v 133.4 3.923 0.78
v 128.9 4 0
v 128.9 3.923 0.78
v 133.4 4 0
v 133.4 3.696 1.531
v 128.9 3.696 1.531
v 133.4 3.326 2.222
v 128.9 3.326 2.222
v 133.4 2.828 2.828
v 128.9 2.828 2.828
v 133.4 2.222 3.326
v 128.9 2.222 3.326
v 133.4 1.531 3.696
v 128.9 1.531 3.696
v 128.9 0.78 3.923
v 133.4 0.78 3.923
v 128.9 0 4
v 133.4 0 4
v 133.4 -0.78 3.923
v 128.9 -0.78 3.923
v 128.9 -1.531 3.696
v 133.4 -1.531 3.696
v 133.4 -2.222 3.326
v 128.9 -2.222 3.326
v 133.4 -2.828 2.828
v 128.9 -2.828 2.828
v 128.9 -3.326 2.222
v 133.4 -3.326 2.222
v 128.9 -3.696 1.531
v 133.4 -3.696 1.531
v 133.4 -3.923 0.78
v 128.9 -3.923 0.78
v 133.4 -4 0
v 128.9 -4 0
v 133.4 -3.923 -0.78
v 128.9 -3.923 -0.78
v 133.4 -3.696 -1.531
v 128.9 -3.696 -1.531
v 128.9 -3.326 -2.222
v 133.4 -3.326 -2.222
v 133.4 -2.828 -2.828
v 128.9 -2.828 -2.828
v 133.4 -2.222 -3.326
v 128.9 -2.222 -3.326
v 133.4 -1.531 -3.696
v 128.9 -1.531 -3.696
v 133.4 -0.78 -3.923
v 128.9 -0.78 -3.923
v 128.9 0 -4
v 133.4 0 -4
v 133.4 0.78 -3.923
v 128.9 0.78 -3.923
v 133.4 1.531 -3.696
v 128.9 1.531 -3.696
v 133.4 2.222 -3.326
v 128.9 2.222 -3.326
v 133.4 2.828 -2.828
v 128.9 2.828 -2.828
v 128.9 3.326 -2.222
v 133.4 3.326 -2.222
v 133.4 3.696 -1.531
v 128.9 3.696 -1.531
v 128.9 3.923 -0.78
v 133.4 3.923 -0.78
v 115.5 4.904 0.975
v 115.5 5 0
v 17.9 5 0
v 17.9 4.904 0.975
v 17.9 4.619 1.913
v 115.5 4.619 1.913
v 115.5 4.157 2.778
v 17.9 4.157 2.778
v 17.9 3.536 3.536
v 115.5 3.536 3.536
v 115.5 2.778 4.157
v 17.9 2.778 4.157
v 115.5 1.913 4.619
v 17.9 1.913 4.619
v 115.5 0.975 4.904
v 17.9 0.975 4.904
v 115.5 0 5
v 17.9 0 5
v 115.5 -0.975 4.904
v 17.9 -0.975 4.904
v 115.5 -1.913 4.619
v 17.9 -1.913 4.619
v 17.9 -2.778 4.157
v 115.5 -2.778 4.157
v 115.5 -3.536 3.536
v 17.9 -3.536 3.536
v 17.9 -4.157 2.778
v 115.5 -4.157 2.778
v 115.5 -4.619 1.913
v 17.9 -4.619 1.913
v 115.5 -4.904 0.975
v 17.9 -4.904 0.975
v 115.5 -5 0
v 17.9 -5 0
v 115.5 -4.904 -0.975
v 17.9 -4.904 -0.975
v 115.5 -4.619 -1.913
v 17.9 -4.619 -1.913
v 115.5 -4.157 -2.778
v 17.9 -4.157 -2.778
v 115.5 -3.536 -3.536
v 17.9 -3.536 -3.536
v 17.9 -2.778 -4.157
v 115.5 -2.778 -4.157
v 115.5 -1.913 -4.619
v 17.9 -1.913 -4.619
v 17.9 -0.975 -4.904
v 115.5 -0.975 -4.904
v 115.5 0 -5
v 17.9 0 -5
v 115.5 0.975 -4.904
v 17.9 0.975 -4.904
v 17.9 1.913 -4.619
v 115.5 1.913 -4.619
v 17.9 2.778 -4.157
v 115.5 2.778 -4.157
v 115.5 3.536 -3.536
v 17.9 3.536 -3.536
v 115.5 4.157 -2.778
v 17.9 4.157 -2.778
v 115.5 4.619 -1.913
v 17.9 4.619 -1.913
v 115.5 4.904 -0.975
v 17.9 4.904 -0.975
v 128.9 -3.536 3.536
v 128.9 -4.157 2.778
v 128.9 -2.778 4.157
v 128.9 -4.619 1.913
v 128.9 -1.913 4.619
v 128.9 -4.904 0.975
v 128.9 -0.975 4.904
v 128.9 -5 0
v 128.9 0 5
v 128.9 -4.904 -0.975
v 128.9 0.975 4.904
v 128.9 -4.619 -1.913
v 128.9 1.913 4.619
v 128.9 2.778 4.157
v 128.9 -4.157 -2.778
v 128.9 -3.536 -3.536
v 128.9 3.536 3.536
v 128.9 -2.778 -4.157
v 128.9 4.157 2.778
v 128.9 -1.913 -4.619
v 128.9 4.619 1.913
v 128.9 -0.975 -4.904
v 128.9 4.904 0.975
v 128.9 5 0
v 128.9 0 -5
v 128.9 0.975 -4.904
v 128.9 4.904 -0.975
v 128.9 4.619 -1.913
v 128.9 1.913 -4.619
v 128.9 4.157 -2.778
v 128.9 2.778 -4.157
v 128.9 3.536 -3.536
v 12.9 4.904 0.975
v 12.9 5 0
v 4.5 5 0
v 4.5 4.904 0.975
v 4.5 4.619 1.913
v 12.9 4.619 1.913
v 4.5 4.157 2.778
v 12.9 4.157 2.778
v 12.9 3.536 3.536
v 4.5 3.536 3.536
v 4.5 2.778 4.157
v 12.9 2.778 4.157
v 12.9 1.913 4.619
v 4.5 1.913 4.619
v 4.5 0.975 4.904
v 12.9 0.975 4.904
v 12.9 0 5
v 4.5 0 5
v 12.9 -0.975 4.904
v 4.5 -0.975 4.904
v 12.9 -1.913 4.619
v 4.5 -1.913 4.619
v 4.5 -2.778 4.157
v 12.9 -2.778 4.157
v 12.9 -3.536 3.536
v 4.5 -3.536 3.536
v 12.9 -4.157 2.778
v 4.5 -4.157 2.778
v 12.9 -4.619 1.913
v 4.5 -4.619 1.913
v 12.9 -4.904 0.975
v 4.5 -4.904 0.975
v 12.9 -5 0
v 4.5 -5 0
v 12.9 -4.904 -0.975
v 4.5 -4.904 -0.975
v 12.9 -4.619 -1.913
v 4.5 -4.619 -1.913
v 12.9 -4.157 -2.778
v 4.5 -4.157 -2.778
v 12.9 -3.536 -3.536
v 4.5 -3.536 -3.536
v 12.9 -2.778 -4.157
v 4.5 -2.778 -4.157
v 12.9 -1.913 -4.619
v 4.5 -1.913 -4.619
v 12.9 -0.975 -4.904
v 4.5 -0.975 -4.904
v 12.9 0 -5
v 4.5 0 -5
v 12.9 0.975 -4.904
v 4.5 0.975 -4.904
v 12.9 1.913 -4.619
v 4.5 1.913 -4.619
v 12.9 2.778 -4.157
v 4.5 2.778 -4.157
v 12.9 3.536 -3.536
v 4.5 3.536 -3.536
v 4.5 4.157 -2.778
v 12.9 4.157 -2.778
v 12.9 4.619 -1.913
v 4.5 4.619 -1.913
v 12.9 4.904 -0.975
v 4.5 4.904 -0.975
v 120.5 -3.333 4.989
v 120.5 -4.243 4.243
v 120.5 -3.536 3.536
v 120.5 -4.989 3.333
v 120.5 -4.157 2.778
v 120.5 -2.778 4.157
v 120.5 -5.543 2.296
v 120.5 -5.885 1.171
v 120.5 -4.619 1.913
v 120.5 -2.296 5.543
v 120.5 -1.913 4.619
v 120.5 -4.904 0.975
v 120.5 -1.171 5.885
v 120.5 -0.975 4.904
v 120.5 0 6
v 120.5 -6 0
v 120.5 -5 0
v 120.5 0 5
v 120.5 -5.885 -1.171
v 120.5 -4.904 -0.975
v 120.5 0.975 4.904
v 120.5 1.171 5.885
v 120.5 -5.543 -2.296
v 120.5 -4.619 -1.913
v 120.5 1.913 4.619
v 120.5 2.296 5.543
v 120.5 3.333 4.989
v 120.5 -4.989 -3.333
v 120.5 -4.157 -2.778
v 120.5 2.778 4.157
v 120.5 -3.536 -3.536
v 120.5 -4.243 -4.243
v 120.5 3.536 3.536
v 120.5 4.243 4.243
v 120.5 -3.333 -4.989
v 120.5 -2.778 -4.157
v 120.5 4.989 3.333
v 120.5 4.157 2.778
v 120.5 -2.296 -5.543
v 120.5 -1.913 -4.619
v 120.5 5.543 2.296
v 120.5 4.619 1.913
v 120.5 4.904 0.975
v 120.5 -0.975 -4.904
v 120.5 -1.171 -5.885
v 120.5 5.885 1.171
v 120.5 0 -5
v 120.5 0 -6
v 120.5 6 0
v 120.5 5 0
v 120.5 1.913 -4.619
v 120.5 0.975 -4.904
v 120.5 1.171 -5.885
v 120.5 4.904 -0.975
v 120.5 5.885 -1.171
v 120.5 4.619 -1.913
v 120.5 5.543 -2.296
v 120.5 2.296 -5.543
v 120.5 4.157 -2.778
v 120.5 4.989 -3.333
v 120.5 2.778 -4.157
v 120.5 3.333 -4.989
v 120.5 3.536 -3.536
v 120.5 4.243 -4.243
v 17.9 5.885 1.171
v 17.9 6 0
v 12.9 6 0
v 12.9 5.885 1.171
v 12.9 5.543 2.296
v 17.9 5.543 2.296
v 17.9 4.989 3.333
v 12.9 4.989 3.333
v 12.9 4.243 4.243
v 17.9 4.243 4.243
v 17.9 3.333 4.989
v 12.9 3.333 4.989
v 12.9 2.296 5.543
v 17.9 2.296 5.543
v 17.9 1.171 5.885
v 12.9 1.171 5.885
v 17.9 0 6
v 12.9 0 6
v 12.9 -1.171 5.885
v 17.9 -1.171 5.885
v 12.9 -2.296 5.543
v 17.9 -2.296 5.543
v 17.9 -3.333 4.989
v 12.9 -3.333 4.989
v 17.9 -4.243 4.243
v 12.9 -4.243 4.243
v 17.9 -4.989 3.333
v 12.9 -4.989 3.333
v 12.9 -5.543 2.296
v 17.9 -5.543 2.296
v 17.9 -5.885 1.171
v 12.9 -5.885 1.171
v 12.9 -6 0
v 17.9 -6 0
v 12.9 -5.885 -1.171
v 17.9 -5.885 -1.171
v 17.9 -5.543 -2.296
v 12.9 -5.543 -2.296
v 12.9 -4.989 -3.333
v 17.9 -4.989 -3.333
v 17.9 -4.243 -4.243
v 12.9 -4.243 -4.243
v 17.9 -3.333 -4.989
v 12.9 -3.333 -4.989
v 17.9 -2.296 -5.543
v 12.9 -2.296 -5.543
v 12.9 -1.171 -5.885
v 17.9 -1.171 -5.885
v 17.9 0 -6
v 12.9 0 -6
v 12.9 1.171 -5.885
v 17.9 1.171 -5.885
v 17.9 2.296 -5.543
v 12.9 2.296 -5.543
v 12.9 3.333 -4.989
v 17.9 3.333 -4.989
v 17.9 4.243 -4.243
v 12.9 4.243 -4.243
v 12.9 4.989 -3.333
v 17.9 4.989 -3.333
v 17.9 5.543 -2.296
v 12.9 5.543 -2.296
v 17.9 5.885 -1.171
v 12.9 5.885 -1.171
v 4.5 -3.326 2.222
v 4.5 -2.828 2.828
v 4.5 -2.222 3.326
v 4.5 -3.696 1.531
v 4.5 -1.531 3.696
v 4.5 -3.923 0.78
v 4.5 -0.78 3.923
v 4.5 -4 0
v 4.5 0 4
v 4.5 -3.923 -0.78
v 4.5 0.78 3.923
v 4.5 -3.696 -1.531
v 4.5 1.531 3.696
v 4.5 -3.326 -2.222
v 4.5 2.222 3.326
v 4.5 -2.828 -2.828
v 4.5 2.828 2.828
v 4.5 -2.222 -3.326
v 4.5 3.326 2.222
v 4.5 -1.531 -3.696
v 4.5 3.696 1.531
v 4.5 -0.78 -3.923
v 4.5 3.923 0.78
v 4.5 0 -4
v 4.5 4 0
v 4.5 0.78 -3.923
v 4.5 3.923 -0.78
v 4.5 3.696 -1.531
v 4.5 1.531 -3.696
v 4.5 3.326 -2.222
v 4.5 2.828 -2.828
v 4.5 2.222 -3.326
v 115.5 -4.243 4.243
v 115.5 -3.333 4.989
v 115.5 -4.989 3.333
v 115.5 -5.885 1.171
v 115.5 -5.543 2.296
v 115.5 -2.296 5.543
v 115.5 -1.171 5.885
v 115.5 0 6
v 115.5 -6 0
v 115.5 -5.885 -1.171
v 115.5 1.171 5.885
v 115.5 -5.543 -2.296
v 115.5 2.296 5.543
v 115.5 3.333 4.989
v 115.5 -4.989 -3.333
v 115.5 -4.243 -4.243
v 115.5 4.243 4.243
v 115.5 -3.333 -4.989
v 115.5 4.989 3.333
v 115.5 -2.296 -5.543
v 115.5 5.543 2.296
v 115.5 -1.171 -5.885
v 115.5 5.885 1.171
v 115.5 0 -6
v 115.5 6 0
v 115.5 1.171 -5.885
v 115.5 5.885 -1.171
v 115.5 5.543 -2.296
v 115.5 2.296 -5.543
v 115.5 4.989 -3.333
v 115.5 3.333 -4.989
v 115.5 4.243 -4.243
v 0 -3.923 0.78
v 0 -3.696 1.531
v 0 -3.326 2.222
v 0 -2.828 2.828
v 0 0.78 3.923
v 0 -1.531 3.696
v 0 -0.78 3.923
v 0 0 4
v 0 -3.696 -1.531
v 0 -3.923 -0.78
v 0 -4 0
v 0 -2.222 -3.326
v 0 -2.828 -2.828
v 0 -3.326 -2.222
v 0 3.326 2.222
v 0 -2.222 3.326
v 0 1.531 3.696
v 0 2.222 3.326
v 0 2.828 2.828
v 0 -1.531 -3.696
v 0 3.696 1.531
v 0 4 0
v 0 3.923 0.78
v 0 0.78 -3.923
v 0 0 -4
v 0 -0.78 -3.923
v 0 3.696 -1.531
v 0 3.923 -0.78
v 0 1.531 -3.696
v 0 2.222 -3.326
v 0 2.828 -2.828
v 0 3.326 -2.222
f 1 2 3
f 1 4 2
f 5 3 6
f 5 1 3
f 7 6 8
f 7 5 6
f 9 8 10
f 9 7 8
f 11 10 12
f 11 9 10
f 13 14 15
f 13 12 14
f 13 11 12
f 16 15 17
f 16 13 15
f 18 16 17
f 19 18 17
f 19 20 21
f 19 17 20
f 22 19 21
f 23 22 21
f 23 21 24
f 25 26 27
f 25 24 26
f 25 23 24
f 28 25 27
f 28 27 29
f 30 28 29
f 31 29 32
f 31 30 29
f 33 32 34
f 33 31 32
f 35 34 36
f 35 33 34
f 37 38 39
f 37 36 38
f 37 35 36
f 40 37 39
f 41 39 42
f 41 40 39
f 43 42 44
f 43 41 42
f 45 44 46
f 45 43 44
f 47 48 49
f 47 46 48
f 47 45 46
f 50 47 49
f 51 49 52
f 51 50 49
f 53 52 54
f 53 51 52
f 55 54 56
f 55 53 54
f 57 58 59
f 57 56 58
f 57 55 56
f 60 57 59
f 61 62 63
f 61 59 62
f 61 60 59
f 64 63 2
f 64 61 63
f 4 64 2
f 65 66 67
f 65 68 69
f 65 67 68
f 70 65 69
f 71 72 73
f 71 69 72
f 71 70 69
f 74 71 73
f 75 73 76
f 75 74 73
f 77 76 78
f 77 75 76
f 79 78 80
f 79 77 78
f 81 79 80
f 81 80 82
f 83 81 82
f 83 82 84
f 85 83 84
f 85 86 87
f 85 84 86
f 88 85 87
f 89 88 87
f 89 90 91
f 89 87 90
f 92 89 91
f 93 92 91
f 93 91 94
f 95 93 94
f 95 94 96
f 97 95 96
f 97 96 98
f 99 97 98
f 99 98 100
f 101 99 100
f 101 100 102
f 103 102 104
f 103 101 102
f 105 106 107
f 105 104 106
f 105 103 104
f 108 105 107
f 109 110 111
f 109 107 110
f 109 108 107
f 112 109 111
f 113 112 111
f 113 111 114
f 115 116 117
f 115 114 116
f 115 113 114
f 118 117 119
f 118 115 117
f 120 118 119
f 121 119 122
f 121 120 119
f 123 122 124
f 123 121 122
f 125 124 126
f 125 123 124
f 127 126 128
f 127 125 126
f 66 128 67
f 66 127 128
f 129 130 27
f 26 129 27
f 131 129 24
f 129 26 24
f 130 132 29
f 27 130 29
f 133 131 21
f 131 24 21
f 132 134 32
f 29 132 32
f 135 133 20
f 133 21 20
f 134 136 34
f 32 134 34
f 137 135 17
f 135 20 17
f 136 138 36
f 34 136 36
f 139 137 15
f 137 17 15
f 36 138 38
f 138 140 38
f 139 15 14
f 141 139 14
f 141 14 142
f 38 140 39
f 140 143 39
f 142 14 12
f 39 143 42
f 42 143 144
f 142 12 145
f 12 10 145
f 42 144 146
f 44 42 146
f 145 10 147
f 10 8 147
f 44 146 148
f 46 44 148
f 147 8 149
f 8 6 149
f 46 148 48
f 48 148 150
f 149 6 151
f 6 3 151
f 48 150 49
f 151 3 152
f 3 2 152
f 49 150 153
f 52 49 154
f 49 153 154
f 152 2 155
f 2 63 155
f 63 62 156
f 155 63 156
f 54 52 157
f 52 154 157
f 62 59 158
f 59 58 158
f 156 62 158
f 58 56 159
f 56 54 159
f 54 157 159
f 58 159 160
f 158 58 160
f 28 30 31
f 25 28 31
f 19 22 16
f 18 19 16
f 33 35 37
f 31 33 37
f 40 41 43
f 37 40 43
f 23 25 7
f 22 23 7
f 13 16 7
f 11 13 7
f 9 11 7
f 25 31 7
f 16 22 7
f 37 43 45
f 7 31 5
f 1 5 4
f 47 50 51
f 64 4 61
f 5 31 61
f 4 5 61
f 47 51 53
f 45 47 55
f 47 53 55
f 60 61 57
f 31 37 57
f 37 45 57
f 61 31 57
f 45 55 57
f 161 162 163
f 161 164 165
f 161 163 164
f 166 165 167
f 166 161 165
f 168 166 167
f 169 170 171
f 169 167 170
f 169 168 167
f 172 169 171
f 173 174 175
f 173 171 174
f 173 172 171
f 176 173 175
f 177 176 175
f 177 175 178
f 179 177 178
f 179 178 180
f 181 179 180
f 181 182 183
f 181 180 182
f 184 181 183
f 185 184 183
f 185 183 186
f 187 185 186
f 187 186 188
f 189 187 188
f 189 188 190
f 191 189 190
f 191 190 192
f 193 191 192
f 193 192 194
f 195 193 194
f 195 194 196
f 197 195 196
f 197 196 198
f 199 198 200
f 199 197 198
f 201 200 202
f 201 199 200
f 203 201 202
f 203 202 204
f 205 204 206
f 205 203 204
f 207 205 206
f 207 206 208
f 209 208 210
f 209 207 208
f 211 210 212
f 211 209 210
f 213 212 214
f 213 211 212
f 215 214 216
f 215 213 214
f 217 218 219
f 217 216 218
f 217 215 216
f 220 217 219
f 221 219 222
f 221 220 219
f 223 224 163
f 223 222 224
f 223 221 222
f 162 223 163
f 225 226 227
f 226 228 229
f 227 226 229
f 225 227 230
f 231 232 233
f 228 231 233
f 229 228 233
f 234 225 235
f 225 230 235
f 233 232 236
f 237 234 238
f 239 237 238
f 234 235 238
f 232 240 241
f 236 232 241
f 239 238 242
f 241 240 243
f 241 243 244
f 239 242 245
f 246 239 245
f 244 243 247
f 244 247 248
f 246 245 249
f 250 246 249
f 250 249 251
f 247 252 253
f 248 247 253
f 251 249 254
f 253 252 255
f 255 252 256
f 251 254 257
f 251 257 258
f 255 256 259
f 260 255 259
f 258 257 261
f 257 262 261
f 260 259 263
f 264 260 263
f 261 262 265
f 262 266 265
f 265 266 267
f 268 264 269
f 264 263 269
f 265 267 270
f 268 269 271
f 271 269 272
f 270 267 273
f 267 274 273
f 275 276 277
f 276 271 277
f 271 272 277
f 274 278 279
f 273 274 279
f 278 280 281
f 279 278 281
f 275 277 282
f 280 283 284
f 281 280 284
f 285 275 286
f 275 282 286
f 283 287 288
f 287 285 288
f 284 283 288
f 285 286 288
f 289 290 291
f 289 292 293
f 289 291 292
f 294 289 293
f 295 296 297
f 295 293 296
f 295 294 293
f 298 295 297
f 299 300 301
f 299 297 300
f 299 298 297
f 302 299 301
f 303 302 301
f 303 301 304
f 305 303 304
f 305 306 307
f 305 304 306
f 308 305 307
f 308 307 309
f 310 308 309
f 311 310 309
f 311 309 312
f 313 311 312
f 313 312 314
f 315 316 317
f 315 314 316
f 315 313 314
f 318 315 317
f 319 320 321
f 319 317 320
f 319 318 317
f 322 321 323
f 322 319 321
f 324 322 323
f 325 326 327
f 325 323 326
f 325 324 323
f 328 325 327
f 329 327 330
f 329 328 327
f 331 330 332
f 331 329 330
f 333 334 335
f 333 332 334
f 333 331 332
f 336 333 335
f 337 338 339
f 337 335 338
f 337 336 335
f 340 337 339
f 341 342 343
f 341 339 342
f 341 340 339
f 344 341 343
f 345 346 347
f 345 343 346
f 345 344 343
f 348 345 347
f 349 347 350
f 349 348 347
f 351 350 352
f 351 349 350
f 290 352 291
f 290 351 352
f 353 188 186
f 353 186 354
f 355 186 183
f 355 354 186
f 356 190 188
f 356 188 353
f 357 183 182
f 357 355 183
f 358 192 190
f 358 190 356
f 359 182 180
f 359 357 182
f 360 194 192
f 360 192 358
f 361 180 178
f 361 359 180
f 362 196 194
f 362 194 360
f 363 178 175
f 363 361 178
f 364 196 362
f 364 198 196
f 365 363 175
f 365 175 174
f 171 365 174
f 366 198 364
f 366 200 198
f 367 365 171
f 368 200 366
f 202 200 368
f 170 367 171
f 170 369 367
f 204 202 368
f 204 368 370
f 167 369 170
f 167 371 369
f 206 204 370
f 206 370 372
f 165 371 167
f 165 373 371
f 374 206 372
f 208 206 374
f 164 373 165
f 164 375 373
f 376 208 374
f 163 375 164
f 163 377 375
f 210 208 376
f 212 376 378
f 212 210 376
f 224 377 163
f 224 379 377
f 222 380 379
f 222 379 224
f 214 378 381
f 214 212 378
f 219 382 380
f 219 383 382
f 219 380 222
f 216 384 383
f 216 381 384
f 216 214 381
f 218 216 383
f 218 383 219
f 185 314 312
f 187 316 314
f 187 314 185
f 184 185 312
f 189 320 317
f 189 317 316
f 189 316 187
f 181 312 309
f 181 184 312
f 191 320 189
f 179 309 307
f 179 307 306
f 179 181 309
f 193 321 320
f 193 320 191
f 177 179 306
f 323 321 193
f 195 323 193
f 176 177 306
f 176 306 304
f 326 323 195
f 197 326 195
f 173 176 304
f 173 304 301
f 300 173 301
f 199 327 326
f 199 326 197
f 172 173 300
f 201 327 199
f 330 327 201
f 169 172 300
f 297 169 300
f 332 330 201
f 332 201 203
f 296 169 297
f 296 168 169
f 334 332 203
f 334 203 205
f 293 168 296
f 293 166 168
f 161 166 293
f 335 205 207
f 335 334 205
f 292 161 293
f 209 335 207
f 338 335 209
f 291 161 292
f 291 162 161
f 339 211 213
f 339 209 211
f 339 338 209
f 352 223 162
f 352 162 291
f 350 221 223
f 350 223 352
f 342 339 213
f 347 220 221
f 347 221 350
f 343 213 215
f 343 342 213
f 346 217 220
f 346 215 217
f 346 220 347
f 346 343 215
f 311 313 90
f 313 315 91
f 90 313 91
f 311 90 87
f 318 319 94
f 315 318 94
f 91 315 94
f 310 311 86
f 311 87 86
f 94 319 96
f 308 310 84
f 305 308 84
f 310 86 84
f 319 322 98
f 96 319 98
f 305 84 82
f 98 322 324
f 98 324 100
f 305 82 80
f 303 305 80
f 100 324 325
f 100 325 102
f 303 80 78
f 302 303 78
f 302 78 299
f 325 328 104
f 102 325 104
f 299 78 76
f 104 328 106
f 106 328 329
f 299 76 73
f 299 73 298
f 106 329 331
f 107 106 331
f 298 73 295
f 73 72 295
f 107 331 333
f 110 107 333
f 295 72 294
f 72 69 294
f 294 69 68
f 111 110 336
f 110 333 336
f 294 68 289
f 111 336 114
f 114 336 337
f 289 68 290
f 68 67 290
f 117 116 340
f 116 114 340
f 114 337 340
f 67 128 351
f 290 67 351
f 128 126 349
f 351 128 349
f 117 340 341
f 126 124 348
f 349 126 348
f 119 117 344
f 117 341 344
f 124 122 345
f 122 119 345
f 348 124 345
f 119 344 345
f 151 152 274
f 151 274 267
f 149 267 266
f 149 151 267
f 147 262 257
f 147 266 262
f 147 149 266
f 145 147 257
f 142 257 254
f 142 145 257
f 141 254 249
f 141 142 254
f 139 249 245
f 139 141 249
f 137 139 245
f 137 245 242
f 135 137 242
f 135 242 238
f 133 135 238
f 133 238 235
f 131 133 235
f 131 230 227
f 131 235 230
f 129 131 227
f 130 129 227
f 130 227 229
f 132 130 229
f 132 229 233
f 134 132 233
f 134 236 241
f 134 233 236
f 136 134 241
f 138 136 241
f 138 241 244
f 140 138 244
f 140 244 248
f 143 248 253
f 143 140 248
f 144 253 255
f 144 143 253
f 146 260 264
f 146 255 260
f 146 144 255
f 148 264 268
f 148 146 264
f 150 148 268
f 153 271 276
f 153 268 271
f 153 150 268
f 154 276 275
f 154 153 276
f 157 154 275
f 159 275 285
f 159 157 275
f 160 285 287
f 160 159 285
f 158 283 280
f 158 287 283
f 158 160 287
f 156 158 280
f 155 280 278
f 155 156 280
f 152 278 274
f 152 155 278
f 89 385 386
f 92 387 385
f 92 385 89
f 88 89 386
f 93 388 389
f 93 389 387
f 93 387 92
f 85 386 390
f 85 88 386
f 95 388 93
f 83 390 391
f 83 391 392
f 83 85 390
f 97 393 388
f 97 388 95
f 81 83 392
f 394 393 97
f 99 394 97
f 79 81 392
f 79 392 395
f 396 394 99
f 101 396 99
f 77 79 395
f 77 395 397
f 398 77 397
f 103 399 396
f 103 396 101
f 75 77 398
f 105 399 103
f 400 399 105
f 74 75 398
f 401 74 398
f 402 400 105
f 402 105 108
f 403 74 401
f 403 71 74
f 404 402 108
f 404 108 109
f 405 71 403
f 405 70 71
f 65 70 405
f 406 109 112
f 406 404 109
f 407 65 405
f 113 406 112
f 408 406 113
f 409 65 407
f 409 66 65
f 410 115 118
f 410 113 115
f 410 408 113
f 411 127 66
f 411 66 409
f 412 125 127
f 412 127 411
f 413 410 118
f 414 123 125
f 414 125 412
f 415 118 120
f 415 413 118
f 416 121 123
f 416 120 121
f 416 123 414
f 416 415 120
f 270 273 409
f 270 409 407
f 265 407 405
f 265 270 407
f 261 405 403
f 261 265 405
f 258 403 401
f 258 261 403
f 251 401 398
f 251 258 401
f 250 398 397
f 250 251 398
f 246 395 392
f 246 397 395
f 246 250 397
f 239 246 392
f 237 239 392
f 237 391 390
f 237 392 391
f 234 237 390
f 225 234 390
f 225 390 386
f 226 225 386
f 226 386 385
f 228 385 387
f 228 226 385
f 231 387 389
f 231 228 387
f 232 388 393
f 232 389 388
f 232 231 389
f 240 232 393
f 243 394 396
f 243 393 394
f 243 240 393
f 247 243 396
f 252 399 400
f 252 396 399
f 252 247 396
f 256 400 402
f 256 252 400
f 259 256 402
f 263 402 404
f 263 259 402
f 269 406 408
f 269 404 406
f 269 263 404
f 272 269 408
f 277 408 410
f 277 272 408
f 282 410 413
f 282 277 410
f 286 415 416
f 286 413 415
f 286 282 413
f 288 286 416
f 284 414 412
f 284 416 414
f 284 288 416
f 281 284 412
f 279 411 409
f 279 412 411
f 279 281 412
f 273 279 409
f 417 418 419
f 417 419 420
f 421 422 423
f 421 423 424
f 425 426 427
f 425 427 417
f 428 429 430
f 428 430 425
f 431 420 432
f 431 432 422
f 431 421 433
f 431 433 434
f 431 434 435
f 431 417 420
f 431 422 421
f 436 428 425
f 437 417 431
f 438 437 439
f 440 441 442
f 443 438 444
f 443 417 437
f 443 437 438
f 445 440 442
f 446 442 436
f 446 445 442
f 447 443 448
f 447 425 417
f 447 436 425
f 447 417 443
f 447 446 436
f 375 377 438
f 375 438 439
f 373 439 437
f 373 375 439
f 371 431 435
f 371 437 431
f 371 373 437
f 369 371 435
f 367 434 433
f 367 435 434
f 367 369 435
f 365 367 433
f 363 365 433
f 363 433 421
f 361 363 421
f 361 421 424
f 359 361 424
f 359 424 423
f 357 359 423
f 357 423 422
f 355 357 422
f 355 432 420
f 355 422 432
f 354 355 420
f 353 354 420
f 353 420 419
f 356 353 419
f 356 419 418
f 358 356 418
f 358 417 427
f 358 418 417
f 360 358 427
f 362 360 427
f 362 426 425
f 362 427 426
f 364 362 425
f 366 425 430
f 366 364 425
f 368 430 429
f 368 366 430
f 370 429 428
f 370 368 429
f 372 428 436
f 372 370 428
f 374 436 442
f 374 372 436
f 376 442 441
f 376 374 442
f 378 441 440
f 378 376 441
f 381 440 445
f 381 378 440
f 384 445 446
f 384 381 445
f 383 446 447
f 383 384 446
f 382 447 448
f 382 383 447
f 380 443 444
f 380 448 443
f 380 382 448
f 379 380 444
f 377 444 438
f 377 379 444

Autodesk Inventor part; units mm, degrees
ref_plane "YZ Plane" through (0, 0, 0) normal (1, 0, 0) x (0, 1, 0)
ref_plane "XZ Plane" through (0, 0, 0) normal (0, 1, 0) x (-1, 0, 0)
ref_plane "XY Plane" through (0, 0, 0) normal (0, 0, 1) x (1, 0, 0)
sketch "Sketch1" plane through (0, 0, 0) normal (0, 0, 1) x (1, 0, 0)
  line L0 (0, 0) -> (0, 4)
  line L1 (0, 4) -> (4.5, 4)
  line L2 (4.5, 4) -> (4.5, 5)
  line L3 (4.5, 5) -> (12.9, 5)
  line L4 (12.9, 5) -> (12.9, 6)
  line L5 (120.5, 6) -> (120.5, 5)
  line L6 (120.5, 5) -> (128.9, 5)
  line L7 (128.9, 5) -> (128.9, 4)
  line L8 (128.9, 4) -> (133.4, 4)
  line L9 (133.4, 4) -> (133.4, 0)
  line L10 (133.4, 0) -> (0, 0)
  line L11 (66.7, 6) -> (66.7, 0) construction
  line L12 (12.9, 6) -> (17.9, 6)
  line L13 (17.9, 6) -> (17.9, 5)
  line L14 (17.9, 5) -> (115.5, 5)
  line L15 (115.5, 5) -> (115.5, 6)
  line L16 (115.5, 6) -> (120.5, 6)
  dimension "d0" = 4
  dimension "d1" = 5
  dimension "d3" = 4.5
  dimension "d4" = 107.6
  dimension "d5" = 124.4
  dimension "d6" = 4.5
  dimension "d8" = 5
  dimension "d9" = 5
  dimension "d11" = 6
revolve "Revolution1" add sketch "Sketch1" angle 360 about axis through (133.4, 0, 0) along (-1, 0, 0)
properties part number "Stopper Axle" material "Stainless Steel"
